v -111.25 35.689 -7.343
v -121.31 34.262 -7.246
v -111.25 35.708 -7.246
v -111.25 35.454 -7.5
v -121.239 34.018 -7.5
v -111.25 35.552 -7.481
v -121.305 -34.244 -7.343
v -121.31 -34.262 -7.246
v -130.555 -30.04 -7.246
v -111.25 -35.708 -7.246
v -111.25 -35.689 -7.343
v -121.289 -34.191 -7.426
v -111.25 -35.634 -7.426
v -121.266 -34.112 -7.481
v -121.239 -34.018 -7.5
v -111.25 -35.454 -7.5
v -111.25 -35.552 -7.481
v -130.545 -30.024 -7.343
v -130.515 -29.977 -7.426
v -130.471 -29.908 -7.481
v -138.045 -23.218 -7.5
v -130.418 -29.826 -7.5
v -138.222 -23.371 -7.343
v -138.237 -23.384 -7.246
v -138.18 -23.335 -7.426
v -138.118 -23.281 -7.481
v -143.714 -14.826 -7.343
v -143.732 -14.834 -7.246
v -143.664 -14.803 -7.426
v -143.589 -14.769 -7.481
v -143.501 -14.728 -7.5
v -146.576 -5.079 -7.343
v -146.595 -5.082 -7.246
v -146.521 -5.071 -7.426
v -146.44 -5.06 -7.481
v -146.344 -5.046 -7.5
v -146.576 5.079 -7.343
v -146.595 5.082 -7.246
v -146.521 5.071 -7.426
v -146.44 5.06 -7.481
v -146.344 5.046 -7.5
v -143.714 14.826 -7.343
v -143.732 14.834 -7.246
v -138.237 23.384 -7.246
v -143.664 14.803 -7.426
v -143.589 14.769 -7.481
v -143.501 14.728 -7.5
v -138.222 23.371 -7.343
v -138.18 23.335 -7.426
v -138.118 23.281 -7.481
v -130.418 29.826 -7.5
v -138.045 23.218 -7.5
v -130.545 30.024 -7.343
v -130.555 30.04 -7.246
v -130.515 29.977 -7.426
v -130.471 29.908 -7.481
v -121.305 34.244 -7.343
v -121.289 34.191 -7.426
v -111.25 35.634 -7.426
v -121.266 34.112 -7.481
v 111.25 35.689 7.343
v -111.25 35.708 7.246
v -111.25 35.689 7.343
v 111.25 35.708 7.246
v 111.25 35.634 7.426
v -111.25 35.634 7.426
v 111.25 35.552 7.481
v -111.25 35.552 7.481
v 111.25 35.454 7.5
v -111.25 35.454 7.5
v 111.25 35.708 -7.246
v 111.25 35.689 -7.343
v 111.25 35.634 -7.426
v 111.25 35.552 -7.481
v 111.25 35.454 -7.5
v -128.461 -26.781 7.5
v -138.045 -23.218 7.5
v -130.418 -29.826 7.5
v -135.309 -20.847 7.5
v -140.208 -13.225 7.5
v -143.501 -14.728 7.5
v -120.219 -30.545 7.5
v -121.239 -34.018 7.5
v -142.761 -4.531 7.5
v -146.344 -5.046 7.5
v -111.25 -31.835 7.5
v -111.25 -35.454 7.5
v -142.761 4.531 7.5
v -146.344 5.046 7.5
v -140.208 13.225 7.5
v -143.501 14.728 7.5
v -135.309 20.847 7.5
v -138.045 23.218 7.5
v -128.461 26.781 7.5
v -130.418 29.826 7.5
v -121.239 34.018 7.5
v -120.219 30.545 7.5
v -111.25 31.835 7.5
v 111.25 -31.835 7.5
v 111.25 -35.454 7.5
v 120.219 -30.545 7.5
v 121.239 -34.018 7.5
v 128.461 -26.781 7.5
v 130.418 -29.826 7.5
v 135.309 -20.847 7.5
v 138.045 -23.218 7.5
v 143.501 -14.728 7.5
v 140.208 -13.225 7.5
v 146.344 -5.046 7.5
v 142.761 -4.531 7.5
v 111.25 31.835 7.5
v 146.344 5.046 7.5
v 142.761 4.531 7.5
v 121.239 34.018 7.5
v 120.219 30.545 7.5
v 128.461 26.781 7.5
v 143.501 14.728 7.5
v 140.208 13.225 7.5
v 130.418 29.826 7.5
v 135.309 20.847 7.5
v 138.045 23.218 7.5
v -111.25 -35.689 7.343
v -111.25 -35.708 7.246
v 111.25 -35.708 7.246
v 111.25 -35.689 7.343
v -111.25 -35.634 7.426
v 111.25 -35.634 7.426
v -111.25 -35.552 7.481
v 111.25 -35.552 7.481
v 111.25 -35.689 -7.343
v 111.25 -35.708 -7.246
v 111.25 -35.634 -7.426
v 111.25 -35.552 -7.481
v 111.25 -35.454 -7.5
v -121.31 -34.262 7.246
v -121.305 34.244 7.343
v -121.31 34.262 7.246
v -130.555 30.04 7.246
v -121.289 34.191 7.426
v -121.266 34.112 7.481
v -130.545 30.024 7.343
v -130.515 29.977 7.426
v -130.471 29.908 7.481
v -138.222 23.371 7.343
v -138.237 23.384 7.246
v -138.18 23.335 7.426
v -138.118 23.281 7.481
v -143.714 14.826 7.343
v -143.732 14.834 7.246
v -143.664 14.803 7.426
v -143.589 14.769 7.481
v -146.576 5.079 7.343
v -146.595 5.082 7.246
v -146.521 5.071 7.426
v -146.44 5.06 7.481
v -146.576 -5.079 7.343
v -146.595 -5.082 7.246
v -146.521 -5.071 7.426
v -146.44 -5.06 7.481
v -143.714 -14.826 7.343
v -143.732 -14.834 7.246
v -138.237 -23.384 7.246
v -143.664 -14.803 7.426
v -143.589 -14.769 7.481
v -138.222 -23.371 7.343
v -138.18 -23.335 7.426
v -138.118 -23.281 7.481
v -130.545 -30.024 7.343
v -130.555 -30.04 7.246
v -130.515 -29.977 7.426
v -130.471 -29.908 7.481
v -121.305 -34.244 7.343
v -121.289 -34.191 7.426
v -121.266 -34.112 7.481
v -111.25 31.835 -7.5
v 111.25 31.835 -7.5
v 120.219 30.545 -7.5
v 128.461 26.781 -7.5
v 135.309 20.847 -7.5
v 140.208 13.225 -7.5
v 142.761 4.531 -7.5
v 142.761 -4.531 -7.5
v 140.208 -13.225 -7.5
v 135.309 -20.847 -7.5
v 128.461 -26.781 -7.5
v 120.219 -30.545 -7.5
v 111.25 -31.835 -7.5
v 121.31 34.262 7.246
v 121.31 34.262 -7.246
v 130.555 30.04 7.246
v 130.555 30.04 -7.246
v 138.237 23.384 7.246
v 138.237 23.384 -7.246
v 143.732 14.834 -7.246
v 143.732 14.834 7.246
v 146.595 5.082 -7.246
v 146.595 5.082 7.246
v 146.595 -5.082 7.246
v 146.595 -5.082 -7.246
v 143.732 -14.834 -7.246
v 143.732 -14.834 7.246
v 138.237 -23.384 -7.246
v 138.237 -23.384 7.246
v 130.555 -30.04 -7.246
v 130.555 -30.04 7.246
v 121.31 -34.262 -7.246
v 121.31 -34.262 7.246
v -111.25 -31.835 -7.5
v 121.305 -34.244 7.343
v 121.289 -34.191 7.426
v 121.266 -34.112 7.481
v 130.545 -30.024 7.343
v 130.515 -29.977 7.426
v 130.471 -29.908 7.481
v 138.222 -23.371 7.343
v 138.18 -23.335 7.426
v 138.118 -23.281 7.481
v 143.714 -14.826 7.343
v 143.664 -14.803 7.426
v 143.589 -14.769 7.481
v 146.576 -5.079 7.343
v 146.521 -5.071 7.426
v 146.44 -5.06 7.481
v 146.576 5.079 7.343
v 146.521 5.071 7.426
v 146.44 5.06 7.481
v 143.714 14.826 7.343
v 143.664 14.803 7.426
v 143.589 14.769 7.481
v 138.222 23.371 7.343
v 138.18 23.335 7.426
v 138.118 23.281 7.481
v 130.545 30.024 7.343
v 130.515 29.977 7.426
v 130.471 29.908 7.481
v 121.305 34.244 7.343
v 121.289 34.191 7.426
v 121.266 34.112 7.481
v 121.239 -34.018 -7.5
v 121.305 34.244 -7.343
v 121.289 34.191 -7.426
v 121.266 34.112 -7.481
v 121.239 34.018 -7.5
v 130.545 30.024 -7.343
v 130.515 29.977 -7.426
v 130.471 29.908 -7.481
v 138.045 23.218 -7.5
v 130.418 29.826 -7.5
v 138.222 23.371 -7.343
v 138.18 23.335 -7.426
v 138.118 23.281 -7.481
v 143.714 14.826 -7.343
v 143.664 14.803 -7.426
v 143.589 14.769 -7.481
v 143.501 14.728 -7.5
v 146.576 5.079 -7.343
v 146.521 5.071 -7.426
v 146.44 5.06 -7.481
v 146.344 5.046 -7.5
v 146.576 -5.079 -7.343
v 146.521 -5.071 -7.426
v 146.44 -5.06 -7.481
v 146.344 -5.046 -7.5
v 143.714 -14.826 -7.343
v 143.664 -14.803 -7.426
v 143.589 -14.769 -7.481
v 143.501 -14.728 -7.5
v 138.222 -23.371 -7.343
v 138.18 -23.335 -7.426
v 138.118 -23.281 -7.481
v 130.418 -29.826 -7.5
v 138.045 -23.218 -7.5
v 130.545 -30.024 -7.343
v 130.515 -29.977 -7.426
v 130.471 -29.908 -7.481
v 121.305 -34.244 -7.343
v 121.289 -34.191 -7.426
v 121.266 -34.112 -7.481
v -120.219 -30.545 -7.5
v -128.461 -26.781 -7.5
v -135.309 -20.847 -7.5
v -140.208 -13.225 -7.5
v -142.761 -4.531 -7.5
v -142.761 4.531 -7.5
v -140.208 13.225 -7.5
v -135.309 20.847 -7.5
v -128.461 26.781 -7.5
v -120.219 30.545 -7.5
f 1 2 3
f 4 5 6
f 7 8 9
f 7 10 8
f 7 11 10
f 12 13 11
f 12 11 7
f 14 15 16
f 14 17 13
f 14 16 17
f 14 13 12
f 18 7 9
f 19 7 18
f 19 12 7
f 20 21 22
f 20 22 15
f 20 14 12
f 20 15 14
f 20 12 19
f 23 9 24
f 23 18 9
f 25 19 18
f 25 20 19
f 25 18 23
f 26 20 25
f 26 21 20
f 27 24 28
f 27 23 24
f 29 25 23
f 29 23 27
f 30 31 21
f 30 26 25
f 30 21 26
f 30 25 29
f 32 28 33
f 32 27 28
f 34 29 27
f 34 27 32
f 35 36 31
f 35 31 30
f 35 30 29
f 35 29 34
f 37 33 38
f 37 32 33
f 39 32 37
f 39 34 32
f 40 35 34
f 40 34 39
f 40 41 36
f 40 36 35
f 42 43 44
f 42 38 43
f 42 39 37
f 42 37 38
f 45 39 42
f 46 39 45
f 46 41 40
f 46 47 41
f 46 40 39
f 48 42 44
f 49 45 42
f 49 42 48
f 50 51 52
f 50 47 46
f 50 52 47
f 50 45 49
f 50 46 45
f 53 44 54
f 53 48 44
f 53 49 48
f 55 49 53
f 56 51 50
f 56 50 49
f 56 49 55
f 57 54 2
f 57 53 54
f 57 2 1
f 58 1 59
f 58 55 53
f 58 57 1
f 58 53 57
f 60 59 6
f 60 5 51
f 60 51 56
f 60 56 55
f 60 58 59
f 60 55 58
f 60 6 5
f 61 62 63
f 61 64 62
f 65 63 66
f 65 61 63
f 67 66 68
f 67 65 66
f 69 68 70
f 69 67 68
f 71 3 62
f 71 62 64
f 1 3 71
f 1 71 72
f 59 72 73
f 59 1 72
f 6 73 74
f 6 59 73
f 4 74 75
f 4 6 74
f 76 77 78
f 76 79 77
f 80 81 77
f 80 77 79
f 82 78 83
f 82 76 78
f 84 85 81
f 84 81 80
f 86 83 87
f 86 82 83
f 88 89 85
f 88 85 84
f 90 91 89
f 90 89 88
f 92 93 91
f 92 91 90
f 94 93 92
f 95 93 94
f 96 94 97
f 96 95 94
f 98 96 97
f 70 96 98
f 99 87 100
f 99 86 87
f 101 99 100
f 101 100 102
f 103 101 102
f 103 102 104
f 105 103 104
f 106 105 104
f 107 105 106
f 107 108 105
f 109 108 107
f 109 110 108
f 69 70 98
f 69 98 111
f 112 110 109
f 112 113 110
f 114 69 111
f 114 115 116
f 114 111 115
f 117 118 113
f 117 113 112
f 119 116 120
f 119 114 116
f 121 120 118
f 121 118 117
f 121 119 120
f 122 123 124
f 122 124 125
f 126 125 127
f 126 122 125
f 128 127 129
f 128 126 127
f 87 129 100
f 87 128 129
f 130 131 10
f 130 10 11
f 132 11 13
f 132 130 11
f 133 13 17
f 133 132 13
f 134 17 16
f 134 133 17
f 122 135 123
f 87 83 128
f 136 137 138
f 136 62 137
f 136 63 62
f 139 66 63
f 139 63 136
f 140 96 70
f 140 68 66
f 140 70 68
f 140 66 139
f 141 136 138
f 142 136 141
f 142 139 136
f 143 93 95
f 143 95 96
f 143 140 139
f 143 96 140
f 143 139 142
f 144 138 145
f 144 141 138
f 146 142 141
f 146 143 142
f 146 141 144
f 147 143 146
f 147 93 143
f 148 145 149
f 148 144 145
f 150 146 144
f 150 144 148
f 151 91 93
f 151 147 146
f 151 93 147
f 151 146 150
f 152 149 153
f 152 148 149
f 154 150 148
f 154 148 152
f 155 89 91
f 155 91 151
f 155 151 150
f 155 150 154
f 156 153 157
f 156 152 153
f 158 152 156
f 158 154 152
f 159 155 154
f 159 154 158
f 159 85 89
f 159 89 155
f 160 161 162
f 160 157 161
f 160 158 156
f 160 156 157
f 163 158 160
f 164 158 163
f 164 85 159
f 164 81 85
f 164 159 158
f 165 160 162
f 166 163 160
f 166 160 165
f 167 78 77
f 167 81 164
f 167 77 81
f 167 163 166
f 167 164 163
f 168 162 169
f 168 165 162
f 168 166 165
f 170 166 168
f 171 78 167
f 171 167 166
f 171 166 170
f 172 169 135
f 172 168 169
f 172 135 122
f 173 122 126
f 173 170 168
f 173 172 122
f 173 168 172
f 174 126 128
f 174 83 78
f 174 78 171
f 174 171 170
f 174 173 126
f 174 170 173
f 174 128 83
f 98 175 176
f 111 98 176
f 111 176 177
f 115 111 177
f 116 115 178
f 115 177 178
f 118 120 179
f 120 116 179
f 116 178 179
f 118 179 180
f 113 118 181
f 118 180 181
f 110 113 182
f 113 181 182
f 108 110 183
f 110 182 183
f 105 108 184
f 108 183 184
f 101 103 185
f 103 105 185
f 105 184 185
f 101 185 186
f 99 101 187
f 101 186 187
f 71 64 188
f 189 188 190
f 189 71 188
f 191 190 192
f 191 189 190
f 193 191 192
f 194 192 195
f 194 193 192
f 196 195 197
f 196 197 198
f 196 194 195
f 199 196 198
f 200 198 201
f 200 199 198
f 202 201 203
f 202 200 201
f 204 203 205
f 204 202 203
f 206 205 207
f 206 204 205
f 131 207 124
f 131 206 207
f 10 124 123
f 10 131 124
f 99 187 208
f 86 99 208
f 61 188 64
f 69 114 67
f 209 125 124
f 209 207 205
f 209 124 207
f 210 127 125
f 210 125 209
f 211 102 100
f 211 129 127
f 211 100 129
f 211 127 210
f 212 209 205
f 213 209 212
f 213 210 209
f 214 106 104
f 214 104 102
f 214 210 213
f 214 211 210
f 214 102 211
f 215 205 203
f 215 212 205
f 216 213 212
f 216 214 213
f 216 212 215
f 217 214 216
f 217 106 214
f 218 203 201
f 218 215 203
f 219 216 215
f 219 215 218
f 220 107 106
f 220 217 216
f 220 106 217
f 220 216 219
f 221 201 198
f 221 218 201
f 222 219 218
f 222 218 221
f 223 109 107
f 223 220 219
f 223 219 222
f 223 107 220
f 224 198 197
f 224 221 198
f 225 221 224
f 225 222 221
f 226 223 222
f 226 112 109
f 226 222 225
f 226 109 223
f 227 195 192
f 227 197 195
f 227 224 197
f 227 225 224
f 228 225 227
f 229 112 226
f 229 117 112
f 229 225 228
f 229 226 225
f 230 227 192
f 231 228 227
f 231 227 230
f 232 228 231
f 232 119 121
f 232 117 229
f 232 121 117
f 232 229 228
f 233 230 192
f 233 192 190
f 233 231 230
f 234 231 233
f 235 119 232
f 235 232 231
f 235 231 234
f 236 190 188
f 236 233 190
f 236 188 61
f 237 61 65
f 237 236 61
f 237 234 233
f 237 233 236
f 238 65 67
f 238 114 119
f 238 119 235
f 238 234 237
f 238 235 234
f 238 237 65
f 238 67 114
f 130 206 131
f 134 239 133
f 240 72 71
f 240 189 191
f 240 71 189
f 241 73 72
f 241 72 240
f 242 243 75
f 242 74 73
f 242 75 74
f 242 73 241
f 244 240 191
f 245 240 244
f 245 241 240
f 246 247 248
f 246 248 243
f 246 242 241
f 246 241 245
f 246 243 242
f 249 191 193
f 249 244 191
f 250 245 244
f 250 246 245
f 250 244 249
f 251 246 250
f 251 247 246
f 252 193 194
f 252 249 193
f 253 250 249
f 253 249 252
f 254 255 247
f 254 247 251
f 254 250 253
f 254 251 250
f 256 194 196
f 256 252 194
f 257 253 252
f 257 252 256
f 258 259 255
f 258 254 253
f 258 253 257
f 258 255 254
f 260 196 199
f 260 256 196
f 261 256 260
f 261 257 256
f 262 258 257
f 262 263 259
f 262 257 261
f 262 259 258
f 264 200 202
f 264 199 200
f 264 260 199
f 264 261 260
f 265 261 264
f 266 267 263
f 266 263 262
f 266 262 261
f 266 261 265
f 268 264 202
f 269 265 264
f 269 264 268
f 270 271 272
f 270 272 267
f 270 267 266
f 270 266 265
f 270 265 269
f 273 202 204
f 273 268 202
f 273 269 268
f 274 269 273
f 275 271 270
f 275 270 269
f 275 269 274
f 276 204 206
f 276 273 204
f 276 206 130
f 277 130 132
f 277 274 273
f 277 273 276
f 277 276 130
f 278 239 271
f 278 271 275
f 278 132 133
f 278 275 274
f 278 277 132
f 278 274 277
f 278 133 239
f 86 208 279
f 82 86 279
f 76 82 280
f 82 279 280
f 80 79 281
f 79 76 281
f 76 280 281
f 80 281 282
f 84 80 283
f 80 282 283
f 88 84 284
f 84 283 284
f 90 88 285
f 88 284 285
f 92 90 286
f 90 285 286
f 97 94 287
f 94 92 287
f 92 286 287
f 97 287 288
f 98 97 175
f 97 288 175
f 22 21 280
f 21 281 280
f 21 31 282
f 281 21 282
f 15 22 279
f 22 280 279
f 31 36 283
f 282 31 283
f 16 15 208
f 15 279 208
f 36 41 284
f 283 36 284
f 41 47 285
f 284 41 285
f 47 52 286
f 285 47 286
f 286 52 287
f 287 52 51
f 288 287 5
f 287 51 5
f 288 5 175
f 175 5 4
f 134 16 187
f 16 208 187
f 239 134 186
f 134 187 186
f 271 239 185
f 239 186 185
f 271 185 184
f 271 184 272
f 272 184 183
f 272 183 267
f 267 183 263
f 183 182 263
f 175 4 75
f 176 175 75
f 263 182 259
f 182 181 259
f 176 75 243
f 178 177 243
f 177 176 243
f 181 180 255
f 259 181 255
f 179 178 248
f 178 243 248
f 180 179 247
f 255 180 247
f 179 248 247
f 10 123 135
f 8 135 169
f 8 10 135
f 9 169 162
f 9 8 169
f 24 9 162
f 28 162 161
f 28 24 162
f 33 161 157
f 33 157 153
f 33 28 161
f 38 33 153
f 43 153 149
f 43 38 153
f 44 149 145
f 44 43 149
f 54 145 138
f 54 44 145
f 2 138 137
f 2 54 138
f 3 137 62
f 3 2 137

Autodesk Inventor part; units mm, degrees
ref_plane "YZ Plane" through (0, 0, 0) normal (1, 0, 0) x (0, 1, 0)
ref_plane "XZ Plane" through (0, 0, 0) normal (0, 1, 0) x (-1, 0, 0)
ref_plane "XY Plane" through (0, 0, 0) normal (0, 0, 1) x (1, 0, 0)
sketch "Sketch1" plane through (0, 0, 0) normal (0, 0, 1) x (1, 0, 0)
  line L0 (111.25, 0) -> (-111.25, 0) construction
  line L1 (111.25, 33.4225) -> (-111.25, 33.4225) construction
  line L2 (-111.25, -33.4225) -> (111.25, -33.4225) construction
  arc A0 (111.25, -33.4225) -> (111.25, 33.4225) centre (111.25, 0) ccw construction
  arc A1 (-111.25, 33.4225) -> (-111.25, -33.4225) centre (-111.25, 0) ccw construction
  line L3 (-111.25, 35.7085) -> (111.25, 35.7085)
  arc A2 (111.25, -35.7085) -> (111.25, 35.7085) centre (111.25, 0) ccw
  line L4 (111.25, -35.7085) -> (-111.25, -35.7085)
  arc A3 (-111.25, 35.7085) -> (-111.25, -35.7085) centre (-111.25, 0) ccw
  line L5 (-111.25, 31.835) -> (111.25, 31.835)
  arc A4 (111.25, -31.835) -> (111.25, 31.835) centre (111.25, 0) ccw
  line L6 (111.25, -31.835) -> (-111.25, -31.835)
  arc A5 (-111.25, 31.835) -> (-111.25, -31.835) centre (-111.25, 0) ccw
  point P0 (0, 0)
  dimension "d0" = 66.8451
  dimension "d1" = 105
  dimension "d2" = 222.5
  dimension "d3" = 2.286
  dimension "d4" = 1.5875
extrude "Extrusion1" add sketch "Sketch1" along normal mid plane 15
fillet "Fillet1" radius 0.254 8 edges at (0, 35.7085, 7.5) (-146.9585, 0, 7.5) (0, -35.7085, 7.5) (146.9585, 0, 7.5) (146.9585, 0, -7.5) (0, -35.7085, -7.5) (-146.9585, 0, -7.5) (0, 35.7085, -7.5)
properties part number "Configurable Kitbot Drive Belt" material "Rubber"
